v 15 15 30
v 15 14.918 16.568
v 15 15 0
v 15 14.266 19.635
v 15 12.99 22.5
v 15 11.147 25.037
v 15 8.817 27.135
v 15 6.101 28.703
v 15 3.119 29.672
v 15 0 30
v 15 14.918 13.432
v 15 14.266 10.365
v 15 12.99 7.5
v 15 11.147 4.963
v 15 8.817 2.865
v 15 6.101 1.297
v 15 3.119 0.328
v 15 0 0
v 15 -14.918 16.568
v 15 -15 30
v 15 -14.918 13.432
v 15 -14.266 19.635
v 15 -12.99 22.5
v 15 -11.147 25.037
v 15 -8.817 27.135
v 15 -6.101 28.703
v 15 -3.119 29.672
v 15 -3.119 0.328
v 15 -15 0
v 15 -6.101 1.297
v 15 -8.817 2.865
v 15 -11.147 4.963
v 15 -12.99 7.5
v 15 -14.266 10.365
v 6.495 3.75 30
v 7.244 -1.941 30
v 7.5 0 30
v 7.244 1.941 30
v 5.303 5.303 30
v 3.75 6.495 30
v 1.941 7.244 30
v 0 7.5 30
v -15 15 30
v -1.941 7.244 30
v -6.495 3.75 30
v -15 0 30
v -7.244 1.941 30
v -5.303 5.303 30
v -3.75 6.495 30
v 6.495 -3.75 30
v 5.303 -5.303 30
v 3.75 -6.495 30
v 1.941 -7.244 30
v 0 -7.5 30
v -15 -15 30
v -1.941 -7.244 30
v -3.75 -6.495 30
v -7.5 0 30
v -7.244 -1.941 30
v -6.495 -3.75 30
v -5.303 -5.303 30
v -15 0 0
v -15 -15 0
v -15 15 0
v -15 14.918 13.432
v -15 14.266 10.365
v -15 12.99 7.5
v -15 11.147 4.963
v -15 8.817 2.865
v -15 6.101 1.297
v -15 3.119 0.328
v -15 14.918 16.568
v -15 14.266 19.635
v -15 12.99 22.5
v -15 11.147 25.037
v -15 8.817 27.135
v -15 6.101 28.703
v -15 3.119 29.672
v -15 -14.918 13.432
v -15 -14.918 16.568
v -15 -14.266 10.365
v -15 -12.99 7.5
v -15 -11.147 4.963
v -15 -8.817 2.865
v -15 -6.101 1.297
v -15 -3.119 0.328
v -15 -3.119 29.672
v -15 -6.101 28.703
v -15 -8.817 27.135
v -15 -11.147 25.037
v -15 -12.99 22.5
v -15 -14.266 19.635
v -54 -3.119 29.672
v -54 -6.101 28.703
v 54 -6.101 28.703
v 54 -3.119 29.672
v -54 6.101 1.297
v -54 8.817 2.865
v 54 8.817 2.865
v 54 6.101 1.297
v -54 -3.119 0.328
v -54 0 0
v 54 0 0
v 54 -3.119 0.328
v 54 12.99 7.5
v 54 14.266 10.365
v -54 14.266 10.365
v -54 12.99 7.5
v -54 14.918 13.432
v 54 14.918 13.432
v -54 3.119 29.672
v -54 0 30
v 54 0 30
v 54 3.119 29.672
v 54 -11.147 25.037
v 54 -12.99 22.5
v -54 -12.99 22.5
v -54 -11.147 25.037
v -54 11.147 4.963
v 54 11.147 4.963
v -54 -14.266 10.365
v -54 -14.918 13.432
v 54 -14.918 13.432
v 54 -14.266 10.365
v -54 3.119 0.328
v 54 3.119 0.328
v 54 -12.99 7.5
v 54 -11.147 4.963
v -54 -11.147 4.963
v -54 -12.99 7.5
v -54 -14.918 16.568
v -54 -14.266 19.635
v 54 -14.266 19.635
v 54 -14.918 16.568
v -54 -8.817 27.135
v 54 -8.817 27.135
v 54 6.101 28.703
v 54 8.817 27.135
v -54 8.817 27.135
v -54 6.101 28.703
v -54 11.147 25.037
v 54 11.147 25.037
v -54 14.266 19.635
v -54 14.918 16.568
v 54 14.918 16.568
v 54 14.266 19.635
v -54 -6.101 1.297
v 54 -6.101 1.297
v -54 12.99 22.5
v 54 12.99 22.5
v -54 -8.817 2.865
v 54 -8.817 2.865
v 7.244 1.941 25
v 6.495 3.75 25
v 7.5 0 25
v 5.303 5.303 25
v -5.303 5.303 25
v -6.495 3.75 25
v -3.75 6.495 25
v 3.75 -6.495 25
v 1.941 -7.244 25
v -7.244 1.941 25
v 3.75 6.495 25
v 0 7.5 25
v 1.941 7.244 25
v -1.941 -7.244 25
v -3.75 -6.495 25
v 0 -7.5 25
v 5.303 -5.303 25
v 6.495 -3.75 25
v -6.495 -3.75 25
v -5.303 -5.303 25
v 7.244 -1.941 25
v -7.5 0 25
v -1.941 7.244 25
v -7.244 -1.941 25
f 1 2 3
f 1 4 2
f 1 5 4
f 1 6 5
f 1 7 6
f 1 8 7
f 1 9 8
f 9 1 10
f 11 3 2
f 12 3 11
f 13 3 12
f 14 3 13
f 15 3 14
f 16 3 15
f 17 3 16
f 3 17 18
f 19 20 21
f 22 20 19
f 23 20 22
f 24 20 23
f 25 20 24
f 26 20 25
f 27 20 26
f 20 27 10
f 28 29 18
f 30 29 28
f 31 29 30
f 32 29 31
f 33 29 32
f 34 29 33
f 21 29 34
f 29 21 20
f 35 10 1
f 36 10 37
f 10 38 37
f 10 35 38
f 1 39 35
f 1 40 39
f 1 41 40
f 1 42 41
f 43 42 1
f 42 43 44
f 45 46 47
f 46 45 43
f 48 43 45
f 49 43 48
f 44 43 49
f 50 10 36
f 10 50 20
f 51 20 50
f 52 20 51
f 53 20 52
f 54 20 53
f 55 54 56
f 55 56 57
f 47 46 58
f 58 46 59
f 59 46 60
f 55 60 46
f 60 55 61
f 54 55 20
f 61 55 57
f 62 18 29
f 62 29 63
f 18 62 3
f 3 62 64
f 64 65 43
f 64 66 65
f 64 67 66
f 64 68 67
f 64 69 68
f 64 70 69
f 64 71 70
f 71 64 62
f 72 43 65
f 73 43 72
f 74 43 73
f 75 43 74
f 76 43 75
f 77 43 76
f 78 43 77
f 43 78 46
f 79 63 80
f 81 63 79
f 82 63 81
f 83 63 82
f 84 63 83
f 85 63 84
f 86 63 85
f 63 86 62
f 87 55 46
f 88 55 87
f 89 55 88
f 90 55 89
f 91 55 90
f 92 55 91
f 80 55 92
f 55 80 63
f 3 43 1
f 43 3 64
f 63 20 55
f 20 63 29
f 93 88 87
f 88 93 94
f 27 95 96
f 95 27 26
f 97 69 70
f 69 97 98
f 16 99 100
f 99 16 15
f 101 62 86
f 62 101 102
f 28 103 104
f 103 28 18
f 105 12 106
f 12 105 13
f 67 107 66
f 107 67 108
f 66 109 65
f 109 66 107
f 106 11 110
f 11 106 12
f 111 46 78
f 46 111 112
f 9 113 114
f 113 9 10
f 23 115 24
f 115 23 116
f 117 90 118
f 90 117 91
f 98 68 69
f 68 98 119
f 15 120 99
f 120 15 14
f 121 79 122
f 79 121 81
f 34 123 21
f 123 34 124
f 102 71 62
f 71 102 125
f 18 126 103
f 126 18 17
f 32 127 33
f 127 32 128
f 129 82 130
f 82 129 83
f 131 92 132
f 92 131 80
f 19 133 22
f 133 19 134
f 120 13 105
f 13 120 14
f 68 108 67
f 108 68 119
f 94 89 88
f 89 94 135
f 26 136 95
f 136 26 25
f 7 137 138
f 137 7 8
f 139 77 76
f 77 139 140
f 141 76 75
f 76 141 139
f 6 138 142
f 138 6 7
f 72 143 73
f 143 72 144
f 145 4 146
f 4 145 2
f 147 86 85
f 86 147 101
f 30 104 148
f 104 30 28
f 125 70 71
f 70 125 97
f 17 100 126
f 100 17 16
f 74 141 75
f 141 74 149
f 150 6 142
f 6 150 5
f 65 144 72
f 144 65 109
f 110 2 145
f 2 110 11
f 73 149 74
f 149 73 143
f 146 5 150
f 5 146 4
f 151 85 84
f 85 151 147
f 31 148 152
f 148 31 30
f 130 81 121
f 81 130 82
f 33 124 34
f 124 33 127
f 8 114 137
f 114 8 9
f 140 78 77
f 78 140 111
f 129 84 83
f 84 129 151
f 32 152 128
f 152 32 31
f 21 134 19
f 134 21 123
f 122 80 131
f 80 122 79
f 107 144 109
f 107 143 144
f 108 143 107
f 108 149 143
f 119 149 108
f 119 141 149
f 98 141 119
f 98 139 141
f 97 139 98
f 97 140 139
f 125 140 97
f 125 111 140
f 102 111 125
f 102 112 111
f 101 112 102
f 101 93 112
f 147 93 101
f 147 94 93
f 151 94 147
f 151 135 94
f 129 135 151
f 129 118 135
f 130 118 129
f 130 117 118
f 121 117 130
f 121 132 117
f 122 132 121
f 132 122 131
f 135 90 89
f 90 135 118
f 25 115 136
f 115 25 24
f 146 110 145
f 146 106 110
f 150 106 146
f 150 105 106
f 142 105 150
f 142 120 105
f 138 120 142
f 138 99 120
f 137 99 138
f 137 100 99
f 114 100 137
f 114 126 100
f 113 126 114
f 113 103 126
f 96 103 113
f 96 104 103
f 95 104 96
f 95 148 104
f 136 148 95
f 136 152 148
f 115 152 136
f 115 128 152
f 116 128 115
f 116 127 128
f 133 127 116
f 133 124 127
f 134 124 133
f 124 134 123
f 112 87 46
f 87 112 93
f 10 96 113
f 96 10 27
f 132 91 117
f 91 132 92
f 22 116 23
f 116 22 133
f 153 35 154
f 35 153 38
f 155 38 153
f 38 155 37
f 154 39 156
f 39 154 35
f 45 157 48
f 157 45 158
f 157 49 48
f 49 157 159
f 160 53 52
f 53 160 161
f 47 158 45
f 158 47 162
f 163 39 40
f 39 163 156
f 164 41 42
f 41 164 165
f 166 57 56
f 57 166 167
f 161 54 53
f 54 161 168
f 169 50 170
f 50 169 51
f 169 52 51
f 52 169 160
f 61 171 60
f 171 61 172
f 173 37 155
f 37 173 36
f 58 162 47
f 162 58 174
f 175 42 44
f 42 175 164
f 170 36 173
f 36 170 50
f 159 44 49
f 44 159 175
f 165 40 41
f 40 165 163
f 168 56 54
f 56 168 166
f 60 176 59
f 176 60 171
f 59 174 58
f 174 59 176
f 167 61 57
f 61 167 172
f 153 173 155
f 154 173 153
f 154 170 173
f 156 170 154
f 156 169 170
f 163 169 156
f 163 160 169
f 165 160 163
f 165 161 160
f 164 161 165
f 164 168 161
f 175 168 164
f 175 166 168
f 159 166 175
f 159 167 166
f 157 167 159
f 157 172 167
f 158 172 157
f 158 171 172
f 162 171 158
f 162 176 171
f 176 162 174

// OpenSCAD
cube_size = 30; // [10:Small,20:Medium,30:Large]

hole_diameter = 15; 
hole_radius = hole_diameter/2;

// How deep should the center hole be?
hole_depth = 5; // [0,1,5,50]

show_wheels = "yes"; // [yes,no]

// How thick should the side wheels be?
wheel_thickness = 39; // [1:40]

// ignore this variable!
// foo=1;

// don't turn functions into params!
function BEZ03(u) = pow((1-u), 3);

// ignore variable values
bing = 3+4;
baz = 3 / hole_depth;

difference() {
  union() {
    translate([0, 0, cube_size/2]) cube([cube_size,cube_size,cube_size], center=true);
    if (show_wheels == "yes") {
      translate([0, 0, cube_size/2]) rotate([0, 90, 0]) {
        cylinder(r=cube_size/2, h=cube_size+(wheel_thickness*2), center=true);
      }
    }
  }
  translate([0, 0, cube_size-hole_depth]) cylinder(r=hole_radius, h=hole_depth);
}
        
